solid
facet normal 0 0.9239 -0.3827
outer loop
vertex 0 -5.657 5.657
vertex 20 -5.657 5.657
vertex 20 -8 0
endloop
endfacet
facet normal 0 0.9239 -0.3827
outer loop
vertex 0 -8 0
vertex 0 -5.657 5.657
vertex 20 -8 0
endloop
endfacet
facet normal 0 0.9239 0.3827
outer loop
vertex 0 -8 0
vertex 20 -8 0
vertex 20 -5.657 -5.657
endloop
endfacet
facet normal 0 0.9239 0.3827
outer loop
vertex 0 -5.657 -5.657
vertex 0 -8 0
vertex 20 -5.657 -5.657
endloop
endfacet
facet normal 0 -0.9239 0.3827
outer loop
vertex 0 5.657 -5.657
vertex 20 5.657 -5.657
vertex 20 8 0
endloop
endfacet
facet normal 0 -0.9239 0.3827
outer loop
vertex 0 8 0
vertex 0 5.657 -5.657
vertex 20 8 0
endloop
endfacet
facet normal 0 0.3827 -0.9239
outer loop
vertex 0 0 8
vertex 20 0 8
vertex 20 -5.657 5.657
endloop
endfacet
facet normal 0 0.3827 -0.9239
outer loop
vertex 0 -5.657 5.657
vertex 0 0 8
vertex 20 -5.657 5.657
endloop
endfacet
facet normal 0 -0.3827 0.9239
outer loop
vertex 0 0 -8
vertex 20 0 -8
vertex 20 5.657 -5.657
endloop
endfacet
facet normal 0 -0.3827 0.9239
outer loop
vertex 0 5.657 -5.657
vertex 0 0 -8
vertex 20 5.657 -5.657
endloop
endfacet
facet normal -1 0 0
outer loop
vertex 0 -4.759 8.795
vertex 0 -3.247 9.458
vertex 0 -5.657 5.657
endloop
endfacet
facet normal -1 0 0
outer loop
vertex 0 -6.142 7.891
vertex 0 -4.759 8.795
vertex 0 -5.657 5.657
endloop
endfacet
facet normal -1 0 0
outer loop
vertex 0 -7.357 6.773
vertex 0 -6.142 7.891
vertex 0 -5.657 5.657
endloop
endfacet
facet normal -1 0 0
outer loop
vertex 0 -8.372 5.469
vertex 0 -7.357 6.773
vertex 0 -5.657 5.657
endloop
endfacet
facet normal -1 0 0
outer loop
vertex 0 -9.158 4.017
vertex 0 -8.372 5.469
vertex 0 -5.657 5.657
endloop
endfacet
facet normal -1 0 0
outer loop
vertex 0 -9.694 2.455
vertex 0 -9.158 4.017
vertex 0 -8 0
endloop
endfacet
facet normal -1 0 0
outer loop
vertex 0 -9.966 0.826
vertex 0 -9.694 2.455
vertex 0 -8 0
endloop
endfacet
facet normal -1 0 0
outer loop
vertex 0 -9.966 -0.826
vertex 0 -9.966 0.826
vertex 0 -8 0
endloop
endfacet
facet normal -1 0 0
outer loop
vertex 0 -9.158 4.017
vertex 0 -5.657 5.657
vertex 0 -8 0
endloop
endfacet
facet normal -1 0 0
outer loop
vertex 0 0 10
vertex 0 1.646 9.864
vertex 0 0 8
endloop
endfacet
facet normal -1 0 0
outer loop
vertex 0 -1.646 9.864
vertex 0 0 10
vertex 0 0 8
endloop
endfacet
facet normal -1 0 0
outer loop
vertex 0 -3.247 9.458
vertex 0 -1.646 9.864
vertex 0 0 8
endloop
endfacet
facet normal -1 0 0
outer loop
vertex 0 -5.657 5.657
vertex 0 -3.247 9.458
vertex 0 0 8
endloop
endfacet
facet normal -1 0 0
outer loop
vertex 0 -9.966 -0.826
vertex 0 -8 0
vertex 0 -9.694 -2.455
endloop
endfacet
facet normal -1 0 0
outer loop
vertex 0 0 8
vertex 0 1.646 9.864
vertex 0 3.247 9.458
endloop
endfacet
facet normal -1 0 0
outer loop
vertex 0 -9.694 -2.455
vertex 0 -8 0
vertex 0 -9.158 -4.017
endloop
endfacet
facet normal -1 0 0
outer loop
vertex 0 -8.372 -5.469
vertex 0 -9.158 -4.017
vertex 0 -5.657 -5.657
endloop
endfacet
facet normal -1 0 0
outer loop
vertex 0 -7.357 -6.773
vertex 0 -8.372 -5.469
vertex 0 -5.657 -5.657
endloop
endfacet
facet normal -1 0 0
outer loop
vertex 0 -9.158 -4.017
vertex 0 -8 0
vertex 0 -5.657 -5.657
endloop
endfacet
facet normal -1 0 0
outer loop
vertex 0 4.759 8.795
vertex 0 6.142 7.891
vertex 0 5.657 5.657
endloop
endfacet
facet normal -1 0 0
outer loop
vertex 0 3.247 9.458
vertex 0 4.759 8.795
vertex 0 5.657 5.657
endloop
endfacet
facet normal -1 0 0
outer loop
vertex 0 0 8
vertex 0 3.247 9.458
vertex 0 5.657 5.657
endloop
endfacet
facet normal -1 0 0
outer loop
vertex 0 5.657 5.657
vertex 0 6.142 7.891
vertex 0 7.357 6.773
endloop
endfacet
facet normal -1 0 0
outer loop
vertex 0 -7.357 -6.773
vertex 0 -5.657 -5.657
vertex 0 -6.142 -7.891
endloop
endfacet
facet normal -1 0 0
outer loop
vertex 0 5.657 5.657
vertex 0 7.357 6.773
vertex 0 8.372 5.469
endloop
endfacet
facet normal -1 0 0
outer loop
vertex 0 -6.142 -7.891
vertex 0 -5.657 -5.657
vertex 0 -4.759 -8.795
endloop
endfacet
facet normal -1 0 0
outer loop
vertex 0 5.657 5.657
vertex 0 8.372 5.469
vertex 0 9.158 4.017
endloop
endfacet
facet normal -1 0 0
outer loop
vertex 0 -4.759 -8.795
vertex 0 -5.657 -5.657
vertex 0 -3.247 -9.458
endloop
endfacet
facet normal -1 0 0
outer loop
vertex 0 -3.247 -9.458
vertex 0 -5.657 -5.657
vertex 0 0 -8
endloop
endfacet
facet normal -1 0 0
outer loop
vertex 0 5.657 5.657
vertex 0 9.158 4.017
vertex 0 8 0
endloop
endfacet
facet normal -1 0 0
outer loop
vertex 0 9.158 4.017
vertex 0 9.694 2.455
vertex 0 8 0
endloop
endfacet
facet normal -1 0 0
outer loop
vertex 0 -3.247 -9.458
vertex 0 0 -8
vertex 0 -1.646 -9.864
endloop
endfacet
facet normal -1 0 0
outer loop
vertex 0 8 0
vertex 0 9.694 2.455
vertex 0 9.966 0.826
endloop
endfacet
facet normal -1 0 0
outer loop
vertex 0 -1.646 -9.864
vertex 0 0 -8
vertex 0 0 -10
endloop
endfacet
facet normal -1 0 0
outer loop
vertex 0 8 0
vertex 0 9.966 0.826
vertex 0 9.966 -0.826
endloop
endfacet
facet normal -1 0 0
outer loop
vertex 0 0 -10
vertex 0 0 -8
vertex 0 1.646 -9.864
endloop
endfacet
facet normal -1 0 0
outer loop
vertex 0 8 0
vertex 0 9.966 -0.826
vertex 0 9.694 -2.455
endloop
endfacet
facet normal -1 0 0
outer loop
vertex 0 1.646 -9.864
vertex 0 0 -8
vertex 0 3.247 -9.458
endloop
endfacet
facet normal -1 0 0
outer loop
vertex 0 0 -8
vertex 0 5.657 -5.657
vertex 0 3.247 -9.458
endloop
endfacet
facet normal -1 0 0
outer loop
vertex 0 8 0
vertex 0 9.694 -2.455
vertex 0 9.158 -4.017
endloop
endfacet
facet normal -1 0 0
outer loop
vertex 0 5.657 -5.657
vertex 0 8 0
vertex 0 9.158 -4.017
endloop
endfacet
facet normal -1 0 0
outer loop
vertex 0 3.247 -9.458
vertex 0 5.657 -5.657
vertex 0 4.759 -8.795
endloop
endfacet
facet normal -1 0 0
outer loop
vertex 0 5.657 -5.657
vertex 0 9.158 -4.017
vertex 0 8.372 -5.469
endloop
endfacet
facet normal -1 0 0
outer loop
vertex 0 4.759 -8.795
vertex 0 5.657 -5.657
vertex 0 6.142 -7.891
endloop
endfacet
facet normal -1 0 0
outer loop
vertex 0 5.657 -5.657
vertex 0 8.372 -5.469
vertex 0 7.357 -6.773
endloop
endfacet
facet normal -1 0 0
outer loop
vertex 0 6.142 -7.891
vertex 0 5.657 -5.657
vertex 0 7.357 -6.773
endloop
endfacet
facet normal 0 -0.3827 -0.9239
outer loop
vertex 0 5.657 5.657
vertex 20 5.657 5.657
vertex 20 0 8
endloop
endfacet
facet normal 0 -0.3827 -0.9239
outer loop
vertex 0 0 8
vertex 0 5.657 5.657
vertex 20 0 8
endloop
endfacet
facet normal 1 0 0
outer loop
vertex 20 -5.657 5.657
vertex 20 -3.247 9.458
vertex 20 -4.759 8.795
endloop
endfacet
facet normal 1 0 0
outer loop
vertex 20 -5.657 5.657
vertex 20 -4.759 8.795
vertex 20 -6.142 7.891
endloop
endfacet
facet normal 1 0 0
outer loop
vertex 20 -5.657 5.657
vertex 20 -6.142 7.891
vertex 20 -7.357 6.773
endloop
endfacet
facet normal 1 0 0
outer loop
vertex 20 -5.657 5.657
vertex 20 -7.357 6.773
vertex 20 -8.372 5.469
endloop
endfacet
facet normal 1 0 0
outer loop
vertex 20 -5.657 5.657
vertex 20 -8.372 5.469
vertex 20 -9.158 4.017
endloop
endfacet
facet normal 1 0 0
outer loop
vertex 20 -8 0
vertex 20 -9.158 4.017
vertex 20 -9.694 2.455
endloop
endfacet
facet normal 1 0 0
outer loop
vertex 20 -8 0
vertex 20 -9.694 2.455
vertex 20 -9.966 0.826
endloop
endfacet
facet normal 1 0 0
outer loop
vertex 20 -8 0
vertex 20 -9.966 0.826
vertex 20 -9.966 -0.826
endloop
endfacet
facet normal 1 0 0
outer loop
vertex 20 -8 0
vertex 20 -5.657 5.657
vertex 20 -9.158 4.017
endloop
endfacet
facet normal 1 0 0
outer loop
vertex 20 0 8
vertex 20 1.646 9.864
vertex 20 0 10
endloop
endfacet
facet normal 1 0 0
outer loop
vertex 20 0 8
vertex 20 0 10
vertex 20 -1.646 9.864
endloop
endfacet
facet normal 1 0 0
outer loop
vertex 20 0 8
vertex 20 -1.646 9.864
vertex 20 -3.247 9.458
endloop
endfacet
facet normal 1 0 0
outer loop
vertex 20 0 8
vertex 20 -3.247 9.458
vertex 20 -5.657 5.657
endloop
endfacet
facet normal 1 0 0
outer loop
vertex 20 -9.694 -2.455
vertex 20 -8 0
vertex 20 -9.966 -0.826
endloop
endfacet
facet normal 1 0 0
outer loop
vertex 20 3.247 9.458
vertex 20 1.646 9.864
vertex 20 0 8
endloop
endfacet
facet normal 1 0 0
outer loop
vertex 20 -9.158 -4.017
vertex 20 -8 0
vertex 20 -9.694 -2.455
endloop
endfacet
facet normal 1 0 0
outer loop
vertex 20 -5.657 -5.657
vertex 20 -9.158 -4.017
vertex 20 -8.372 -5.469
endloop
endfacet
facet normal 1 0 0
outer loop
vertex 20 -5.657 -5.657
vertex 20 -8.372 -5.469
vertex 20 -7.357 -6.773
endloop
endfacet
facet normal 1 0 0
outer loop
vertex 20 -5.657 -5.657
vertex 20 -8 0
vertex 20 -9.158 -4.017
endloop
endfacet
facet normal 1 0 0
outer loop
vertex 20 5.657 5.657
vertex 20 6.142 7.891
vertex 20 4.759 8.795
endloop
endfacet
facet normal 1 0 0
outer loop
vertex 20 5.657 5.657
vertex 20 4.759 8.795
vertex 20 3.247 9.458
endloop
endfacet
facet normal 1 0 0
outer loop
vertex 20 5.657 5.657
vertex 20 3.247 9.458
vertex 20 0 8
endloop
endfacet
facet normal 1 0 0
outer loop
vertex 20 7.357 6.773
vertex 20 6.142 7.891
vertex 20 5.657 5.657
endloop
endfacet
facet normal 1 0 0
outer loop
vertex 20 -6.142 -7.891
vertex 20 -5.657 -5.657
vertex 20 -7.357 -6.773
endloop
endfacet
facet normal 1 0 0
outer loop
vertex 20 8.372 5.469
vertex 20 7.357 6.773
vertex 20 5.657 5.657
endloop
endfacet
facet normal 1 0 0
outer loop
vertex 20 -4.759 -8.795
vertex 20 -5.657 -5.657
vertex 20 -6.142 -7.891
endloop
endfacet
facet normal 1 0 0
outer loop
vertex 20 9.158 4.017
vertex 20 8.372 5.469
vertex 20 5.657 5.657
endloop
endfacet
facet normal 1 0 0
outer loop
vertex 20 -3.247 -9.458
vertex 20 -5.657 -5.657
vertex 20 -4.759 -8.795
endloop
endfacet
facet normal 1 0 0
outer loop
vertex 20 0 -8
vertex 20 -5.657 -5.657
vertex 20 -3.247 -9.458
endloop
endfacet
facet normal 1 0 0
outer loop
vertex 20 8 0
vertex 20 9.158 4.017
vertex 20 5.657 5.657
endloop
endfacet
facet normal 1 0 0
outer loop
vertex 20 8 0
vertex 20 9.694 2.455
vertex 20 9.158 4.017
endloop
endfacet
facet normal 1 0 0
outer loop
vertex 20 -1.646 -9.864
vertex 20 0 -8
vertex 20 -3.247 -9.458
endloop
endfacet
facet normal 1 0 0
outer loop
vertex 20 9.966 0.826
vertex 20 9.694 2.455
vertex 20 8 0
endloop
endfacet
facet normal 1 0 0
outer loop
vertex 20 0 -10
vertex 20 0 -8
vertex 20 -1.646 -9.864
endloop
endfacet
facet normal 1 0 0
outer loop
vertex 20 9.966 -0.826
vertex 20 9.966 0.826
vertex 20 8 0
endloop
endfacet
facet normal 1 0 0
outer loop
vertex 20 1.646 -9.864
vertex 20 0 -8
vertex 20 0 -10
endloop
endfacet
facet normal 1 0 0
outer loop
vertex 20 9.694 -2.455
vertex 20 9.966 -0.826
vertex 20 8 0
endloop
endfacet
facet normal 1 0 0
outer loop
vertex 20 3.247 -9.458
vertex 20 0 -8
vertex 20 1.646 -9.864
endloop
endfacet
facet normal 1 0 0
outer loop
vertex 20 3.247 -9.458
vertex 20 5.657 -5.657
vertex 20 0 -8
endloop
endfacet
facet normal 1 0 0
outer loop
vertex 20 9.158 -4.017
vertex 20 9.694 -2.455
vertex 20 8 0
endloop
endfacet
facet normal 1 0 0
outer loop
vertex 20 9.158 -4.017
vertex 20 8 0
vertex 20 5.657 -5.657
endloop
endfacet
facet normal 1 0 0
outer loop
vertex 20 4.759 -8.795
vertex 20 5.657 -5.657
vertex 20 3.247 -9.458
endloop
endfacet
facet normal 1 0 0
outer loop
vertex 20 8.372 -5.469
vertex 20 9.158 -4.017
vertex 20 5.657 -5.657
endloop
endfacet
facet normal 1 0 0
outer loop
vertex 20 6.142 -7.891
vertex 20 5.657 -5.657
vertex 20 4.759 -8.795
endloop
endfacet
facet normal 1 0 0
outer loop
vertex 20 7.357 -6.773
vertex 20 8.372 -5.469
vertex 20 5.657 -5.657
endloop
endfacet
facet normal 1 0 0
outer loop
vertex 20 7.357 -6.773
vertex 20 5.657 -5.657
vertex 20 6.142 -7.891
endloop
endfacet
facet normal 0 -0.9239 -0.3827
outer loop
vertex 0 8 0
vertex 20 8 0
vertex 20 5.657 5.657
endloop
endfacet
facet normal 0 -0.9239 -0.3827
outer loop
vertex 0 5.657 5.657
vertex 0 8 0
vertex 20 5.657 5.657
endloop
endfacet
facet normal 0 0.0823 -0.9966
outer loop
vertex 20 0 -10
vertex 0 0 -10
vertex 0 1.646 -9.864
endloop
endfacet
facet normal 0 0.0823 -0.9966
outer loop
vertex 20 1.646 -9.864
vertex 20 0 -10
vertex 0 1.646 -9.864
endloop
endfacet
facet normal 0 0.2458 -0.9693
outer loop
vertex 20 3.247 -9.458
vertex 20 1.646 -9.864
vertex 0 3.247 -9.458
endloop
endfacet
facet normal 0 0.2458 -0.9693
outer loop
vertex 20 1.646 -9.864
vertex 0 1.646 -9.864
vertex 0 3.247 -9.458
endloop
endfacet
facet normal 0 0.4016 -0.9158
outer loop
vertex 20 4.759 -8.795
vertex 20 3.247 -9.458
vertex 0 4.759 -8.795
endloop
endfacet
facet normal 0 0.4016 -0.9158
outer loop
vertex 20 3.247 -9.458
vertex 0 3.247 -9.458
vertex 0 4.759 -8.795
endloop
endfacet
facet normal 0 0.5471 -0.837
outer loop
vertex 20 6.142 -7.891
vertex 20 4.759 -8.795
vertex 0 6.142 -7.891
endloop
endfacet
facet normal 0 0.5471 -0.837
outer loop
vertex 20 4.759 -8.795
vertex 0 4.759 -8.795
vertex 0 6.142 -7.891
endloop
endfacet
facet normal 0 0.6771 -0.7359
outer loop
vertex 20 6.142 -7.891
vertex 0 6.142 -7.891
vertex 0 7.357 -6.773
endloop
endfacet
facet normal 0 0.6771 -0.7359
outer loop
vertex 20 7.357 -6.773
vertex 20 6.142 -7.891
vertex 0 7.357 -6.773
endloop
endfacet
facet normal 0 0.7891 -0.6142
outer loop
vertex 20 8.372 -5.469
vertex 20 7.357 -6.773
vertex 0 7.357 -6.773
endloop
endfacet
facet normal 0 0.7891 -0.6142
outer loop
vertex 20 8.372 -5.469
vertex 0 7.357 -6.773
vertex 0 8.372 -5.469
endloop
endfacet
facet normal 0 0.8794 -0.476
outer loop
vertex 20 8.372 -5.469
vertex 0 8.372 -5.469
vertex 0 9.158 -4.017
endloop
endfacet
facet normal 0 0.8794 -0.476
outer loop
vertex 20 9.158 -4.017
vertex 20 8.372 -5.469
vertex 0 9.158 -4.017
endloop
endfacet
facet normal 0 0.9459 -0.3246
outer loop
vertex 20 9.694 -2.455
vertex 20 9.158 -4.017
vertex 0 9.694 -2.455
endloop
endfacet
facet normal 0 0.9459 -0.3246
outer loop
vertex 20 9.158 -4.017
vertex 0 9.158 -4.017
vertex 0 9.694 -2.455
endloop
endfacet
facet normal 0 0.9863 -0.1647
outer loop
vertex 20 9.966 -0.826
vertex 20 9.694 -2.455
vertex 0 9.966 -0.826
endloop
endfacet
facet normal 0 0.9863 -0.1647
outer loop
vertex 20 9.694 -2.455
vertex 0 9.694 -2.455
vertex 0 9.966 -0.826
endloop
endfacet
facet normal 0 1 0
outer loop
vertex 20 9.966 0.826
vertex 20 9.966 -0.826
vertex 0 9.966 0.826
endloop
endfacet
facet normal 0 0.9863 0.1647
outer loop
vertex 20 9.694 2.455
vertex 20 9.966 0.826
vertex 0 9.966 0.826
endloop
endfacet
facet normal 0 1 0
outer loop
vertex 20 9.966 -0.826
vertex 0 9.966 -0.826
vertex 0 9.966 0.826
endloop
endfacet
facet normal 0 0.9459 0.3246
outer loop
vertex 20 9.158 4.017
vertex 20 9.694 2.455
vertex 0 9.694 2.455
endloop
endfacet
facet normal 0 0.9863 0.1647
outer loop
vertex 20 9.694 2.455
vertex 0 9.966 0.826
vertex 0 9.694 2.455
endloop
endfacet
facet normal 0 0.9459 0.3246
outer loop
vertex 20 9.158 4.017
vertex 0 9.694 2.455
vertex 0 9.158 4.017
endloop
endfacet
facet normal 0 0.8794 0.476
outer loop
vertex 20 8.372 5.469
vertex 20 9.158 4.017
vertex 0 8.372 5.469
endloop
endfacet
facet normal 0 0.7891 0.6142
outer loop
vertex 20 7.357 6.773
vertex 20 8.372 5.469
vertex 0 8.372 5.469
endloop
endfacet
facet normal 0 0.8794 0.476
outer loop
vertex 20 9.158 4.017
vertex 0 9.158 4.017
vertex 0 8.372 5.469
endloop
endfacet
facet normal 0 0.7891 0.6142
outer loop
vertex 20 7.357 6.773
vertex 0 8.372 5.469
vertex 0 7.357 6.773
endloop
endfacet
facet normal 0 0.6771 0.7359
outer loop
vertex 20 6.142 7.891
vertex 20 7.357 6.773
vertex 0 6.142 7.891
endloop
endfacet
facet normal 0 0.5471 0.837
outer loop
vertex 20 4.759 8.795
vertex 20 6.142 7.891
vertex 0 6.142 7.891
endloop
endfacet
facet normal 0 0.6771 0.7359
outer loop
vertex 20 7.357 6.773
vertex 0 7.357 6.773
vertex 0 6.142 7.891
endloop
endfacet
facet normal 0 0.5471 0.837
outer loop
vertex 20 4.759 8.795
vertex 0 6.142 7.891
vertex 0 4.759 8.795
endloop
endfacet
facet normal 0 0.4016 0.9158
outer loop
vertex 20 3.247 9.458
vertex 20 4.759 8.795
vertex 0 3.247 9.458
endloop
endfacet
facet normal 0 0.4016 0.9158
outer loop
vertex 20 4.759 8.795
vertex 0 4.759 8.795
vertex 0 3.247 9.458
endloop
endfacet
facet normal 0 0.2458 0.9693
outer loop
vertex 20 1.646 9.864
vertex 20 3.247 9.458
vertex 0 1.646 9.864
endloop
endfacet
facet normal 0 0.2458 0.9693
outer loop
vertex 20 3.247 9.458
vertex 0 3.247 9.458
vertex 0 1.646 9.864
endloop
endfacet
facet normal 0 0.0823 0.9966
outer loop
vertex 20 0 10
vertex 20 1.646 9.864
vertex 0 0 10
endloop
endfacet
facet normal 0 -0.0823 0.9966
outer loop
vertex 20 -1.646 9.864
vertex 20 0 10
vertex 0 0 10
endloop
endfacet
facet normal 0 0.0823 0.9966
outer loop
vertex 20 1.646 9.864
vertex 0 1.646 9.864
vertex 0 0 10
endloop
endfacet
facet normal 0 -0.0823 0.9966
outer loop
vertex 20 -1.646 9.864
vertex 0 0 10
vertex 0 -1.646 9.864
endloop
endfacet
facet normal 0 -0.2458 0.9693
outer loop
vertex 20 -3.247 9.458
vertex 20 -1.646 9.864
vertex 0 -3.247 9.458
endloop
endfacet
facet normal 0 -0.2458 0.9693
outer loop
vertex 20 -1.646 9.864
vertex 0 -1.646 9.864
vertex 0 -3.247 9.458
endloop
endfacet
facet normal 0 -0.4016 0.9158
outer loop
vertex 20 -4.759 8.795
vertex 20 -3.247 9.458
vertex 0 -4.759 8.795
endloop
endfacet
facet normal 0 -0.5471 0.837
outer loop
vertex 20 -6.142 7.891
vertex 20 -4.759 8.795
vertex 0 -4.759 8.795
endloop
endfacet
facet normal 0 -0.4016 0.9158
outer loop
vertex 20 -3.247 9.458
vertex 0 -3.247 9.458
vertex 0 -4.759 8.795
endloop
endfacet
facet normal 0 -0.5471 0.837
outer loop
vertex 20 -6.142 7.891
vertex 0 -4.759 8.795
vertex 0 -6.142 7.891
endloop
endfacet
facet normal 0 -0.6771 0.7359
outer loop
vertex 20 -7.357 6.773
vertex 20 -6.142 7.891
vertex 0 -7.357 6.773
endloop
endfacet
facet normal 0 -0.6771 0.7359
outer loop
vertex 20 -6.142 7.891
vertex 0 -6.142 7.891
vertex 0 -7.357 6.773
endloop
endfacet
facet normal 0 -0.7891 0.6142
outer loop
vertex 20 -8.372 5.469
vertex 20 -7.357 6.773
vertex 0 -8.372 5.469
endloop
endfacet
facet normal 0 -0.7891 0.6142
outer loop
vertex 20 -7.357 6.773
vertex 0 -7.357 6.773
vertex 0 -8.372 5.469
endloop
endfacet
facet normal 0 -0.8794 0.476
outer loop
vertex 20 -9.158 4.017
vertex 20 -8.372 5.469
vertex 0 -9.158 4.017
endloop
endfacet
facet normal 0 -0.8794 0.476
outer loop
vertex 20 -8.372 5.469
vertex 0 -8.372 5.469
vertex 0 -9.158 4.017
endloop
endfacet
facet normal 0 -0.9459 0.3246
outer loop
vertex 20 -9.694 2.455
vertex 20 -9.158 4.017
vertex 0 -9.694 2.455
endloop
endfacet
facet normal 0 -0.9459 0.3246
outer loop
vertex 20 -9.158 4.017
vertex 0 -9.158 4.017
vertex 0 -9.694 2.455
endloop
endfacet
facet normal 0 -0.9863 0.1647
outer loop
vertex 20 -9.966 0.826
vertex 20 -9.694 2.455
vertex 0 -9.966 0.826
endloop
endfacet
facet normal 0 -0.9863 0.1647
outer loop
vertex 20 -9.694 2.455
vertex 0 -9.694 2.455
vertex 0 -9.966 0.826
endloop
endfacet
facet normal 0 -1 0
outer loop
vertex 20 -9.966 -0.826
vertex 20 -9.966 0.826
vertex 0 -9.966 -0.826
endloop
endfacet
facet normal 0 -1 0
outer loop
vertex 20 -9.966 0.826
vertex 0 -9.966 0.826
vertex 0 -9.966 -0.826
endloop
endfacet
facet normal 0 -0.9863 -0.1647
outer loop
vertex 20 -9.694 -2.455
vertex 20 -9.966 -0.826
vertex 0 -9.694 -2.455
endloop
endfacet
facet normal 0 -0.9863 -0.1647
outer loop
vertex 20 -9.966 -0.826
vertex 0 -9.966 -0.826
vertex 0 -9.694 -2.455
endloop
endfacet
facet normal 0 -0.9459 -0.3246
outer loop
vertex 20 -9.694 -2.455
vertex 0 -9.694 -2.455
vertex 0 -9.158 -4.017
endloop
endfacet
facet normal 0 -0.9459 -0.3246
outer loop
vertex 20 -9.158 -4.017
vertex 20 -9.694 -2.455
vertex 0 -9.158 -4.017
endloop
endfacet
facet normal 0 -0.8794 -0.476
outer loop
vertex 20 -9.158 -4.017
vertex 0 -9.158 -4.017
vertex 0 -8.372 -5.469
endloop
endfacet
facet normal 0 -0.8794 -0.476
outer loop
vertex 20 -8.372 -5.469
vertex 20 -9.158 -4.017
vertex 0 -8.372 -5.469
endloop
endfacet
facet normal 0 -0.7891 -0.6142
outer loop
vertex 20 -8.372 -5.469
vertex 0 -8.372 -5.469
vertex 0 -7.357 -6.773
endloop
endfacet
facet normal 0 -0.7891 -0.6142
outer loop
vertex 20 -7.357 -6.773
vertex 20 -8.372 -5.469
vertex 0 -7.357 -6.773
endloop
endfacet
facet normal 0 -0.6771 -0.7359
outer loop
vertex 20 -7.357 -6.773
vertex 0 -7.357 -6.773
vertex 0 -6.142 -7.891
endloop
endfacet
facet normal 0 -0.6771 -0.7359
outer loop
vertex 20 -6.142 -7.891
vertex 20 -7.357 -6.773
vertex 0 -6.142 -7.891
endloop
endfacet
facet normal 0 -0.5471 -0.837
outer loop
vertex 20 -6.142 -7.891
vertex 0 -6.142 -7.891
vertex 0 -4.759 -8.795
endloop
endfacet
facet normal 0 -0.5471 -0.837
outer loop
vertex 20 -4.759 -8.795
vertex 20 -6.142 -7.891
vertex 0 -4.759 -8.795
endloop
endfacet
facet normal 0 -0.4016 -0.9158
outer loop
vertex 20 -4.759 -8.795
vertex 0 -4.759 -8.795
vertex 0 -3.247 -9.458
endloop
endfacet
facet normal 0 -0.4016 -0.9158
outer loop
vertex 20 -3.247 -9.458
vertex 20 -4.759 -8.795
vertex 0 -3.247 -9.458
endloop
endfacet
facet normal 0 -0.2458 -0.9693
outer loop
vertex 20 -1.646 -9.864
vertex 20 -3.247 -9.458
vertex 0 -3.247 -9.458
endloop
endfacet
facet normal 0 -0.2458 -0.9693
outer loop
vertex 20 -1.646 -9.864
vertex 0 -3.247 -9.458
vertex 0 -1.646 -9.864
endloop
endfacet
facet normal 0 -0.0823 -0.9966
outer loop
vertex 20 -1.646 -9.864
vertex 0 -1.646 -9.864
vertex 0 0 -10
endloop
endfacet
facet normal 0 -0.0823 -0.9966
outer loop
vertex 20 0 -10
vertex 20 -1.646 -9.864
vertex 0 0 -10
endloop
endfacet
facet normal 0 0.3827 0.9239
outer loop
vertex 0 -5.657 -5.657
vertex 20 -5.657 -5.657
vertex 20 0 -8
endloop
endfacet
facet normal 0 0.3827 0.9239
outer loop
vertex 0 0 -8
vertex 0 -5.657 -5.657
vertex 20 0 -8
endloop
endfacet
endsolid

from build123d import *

# Parameters (mm, degrees)
SKETCH2_R           = 10
BOSS_EXTRUDE5_DEPTH = 20
CUT_EXTRUDE1_DEPTH  = 20


with BuildPart() as part:
    # Sketch2 → Boss-Extrude5 (new body)
    with BuildSketch(Plane(origin=(0, 0, 0), x_dir=(0, 0, -1), z_dir=(1, 0, 0))):
        Circle(SKETCH2_R)
    extrude(amount=BOSS_EXTRUDE5_DEPTH)

    # Sketch5 → Cut-Extrude1 (cut)
    with BuildSketch(Plane(origin=(20, 0, 0), x_dir=(0, 0, -1), z_dir=(1, 0, 0))):
        Polygon((8, 0), (5.656854249, 5.656854249), (0, 8), (-5.656854249, 5.656854249), (-8, 0), (-5.656854249, -5.656854249), (0, -8), (5.656854249, -5.656854249), align=None)
    extrude(amount=-CUT_EXTRUDE1_DEPTH, mode=Mode.SUBTRACT)


solid = part.part
